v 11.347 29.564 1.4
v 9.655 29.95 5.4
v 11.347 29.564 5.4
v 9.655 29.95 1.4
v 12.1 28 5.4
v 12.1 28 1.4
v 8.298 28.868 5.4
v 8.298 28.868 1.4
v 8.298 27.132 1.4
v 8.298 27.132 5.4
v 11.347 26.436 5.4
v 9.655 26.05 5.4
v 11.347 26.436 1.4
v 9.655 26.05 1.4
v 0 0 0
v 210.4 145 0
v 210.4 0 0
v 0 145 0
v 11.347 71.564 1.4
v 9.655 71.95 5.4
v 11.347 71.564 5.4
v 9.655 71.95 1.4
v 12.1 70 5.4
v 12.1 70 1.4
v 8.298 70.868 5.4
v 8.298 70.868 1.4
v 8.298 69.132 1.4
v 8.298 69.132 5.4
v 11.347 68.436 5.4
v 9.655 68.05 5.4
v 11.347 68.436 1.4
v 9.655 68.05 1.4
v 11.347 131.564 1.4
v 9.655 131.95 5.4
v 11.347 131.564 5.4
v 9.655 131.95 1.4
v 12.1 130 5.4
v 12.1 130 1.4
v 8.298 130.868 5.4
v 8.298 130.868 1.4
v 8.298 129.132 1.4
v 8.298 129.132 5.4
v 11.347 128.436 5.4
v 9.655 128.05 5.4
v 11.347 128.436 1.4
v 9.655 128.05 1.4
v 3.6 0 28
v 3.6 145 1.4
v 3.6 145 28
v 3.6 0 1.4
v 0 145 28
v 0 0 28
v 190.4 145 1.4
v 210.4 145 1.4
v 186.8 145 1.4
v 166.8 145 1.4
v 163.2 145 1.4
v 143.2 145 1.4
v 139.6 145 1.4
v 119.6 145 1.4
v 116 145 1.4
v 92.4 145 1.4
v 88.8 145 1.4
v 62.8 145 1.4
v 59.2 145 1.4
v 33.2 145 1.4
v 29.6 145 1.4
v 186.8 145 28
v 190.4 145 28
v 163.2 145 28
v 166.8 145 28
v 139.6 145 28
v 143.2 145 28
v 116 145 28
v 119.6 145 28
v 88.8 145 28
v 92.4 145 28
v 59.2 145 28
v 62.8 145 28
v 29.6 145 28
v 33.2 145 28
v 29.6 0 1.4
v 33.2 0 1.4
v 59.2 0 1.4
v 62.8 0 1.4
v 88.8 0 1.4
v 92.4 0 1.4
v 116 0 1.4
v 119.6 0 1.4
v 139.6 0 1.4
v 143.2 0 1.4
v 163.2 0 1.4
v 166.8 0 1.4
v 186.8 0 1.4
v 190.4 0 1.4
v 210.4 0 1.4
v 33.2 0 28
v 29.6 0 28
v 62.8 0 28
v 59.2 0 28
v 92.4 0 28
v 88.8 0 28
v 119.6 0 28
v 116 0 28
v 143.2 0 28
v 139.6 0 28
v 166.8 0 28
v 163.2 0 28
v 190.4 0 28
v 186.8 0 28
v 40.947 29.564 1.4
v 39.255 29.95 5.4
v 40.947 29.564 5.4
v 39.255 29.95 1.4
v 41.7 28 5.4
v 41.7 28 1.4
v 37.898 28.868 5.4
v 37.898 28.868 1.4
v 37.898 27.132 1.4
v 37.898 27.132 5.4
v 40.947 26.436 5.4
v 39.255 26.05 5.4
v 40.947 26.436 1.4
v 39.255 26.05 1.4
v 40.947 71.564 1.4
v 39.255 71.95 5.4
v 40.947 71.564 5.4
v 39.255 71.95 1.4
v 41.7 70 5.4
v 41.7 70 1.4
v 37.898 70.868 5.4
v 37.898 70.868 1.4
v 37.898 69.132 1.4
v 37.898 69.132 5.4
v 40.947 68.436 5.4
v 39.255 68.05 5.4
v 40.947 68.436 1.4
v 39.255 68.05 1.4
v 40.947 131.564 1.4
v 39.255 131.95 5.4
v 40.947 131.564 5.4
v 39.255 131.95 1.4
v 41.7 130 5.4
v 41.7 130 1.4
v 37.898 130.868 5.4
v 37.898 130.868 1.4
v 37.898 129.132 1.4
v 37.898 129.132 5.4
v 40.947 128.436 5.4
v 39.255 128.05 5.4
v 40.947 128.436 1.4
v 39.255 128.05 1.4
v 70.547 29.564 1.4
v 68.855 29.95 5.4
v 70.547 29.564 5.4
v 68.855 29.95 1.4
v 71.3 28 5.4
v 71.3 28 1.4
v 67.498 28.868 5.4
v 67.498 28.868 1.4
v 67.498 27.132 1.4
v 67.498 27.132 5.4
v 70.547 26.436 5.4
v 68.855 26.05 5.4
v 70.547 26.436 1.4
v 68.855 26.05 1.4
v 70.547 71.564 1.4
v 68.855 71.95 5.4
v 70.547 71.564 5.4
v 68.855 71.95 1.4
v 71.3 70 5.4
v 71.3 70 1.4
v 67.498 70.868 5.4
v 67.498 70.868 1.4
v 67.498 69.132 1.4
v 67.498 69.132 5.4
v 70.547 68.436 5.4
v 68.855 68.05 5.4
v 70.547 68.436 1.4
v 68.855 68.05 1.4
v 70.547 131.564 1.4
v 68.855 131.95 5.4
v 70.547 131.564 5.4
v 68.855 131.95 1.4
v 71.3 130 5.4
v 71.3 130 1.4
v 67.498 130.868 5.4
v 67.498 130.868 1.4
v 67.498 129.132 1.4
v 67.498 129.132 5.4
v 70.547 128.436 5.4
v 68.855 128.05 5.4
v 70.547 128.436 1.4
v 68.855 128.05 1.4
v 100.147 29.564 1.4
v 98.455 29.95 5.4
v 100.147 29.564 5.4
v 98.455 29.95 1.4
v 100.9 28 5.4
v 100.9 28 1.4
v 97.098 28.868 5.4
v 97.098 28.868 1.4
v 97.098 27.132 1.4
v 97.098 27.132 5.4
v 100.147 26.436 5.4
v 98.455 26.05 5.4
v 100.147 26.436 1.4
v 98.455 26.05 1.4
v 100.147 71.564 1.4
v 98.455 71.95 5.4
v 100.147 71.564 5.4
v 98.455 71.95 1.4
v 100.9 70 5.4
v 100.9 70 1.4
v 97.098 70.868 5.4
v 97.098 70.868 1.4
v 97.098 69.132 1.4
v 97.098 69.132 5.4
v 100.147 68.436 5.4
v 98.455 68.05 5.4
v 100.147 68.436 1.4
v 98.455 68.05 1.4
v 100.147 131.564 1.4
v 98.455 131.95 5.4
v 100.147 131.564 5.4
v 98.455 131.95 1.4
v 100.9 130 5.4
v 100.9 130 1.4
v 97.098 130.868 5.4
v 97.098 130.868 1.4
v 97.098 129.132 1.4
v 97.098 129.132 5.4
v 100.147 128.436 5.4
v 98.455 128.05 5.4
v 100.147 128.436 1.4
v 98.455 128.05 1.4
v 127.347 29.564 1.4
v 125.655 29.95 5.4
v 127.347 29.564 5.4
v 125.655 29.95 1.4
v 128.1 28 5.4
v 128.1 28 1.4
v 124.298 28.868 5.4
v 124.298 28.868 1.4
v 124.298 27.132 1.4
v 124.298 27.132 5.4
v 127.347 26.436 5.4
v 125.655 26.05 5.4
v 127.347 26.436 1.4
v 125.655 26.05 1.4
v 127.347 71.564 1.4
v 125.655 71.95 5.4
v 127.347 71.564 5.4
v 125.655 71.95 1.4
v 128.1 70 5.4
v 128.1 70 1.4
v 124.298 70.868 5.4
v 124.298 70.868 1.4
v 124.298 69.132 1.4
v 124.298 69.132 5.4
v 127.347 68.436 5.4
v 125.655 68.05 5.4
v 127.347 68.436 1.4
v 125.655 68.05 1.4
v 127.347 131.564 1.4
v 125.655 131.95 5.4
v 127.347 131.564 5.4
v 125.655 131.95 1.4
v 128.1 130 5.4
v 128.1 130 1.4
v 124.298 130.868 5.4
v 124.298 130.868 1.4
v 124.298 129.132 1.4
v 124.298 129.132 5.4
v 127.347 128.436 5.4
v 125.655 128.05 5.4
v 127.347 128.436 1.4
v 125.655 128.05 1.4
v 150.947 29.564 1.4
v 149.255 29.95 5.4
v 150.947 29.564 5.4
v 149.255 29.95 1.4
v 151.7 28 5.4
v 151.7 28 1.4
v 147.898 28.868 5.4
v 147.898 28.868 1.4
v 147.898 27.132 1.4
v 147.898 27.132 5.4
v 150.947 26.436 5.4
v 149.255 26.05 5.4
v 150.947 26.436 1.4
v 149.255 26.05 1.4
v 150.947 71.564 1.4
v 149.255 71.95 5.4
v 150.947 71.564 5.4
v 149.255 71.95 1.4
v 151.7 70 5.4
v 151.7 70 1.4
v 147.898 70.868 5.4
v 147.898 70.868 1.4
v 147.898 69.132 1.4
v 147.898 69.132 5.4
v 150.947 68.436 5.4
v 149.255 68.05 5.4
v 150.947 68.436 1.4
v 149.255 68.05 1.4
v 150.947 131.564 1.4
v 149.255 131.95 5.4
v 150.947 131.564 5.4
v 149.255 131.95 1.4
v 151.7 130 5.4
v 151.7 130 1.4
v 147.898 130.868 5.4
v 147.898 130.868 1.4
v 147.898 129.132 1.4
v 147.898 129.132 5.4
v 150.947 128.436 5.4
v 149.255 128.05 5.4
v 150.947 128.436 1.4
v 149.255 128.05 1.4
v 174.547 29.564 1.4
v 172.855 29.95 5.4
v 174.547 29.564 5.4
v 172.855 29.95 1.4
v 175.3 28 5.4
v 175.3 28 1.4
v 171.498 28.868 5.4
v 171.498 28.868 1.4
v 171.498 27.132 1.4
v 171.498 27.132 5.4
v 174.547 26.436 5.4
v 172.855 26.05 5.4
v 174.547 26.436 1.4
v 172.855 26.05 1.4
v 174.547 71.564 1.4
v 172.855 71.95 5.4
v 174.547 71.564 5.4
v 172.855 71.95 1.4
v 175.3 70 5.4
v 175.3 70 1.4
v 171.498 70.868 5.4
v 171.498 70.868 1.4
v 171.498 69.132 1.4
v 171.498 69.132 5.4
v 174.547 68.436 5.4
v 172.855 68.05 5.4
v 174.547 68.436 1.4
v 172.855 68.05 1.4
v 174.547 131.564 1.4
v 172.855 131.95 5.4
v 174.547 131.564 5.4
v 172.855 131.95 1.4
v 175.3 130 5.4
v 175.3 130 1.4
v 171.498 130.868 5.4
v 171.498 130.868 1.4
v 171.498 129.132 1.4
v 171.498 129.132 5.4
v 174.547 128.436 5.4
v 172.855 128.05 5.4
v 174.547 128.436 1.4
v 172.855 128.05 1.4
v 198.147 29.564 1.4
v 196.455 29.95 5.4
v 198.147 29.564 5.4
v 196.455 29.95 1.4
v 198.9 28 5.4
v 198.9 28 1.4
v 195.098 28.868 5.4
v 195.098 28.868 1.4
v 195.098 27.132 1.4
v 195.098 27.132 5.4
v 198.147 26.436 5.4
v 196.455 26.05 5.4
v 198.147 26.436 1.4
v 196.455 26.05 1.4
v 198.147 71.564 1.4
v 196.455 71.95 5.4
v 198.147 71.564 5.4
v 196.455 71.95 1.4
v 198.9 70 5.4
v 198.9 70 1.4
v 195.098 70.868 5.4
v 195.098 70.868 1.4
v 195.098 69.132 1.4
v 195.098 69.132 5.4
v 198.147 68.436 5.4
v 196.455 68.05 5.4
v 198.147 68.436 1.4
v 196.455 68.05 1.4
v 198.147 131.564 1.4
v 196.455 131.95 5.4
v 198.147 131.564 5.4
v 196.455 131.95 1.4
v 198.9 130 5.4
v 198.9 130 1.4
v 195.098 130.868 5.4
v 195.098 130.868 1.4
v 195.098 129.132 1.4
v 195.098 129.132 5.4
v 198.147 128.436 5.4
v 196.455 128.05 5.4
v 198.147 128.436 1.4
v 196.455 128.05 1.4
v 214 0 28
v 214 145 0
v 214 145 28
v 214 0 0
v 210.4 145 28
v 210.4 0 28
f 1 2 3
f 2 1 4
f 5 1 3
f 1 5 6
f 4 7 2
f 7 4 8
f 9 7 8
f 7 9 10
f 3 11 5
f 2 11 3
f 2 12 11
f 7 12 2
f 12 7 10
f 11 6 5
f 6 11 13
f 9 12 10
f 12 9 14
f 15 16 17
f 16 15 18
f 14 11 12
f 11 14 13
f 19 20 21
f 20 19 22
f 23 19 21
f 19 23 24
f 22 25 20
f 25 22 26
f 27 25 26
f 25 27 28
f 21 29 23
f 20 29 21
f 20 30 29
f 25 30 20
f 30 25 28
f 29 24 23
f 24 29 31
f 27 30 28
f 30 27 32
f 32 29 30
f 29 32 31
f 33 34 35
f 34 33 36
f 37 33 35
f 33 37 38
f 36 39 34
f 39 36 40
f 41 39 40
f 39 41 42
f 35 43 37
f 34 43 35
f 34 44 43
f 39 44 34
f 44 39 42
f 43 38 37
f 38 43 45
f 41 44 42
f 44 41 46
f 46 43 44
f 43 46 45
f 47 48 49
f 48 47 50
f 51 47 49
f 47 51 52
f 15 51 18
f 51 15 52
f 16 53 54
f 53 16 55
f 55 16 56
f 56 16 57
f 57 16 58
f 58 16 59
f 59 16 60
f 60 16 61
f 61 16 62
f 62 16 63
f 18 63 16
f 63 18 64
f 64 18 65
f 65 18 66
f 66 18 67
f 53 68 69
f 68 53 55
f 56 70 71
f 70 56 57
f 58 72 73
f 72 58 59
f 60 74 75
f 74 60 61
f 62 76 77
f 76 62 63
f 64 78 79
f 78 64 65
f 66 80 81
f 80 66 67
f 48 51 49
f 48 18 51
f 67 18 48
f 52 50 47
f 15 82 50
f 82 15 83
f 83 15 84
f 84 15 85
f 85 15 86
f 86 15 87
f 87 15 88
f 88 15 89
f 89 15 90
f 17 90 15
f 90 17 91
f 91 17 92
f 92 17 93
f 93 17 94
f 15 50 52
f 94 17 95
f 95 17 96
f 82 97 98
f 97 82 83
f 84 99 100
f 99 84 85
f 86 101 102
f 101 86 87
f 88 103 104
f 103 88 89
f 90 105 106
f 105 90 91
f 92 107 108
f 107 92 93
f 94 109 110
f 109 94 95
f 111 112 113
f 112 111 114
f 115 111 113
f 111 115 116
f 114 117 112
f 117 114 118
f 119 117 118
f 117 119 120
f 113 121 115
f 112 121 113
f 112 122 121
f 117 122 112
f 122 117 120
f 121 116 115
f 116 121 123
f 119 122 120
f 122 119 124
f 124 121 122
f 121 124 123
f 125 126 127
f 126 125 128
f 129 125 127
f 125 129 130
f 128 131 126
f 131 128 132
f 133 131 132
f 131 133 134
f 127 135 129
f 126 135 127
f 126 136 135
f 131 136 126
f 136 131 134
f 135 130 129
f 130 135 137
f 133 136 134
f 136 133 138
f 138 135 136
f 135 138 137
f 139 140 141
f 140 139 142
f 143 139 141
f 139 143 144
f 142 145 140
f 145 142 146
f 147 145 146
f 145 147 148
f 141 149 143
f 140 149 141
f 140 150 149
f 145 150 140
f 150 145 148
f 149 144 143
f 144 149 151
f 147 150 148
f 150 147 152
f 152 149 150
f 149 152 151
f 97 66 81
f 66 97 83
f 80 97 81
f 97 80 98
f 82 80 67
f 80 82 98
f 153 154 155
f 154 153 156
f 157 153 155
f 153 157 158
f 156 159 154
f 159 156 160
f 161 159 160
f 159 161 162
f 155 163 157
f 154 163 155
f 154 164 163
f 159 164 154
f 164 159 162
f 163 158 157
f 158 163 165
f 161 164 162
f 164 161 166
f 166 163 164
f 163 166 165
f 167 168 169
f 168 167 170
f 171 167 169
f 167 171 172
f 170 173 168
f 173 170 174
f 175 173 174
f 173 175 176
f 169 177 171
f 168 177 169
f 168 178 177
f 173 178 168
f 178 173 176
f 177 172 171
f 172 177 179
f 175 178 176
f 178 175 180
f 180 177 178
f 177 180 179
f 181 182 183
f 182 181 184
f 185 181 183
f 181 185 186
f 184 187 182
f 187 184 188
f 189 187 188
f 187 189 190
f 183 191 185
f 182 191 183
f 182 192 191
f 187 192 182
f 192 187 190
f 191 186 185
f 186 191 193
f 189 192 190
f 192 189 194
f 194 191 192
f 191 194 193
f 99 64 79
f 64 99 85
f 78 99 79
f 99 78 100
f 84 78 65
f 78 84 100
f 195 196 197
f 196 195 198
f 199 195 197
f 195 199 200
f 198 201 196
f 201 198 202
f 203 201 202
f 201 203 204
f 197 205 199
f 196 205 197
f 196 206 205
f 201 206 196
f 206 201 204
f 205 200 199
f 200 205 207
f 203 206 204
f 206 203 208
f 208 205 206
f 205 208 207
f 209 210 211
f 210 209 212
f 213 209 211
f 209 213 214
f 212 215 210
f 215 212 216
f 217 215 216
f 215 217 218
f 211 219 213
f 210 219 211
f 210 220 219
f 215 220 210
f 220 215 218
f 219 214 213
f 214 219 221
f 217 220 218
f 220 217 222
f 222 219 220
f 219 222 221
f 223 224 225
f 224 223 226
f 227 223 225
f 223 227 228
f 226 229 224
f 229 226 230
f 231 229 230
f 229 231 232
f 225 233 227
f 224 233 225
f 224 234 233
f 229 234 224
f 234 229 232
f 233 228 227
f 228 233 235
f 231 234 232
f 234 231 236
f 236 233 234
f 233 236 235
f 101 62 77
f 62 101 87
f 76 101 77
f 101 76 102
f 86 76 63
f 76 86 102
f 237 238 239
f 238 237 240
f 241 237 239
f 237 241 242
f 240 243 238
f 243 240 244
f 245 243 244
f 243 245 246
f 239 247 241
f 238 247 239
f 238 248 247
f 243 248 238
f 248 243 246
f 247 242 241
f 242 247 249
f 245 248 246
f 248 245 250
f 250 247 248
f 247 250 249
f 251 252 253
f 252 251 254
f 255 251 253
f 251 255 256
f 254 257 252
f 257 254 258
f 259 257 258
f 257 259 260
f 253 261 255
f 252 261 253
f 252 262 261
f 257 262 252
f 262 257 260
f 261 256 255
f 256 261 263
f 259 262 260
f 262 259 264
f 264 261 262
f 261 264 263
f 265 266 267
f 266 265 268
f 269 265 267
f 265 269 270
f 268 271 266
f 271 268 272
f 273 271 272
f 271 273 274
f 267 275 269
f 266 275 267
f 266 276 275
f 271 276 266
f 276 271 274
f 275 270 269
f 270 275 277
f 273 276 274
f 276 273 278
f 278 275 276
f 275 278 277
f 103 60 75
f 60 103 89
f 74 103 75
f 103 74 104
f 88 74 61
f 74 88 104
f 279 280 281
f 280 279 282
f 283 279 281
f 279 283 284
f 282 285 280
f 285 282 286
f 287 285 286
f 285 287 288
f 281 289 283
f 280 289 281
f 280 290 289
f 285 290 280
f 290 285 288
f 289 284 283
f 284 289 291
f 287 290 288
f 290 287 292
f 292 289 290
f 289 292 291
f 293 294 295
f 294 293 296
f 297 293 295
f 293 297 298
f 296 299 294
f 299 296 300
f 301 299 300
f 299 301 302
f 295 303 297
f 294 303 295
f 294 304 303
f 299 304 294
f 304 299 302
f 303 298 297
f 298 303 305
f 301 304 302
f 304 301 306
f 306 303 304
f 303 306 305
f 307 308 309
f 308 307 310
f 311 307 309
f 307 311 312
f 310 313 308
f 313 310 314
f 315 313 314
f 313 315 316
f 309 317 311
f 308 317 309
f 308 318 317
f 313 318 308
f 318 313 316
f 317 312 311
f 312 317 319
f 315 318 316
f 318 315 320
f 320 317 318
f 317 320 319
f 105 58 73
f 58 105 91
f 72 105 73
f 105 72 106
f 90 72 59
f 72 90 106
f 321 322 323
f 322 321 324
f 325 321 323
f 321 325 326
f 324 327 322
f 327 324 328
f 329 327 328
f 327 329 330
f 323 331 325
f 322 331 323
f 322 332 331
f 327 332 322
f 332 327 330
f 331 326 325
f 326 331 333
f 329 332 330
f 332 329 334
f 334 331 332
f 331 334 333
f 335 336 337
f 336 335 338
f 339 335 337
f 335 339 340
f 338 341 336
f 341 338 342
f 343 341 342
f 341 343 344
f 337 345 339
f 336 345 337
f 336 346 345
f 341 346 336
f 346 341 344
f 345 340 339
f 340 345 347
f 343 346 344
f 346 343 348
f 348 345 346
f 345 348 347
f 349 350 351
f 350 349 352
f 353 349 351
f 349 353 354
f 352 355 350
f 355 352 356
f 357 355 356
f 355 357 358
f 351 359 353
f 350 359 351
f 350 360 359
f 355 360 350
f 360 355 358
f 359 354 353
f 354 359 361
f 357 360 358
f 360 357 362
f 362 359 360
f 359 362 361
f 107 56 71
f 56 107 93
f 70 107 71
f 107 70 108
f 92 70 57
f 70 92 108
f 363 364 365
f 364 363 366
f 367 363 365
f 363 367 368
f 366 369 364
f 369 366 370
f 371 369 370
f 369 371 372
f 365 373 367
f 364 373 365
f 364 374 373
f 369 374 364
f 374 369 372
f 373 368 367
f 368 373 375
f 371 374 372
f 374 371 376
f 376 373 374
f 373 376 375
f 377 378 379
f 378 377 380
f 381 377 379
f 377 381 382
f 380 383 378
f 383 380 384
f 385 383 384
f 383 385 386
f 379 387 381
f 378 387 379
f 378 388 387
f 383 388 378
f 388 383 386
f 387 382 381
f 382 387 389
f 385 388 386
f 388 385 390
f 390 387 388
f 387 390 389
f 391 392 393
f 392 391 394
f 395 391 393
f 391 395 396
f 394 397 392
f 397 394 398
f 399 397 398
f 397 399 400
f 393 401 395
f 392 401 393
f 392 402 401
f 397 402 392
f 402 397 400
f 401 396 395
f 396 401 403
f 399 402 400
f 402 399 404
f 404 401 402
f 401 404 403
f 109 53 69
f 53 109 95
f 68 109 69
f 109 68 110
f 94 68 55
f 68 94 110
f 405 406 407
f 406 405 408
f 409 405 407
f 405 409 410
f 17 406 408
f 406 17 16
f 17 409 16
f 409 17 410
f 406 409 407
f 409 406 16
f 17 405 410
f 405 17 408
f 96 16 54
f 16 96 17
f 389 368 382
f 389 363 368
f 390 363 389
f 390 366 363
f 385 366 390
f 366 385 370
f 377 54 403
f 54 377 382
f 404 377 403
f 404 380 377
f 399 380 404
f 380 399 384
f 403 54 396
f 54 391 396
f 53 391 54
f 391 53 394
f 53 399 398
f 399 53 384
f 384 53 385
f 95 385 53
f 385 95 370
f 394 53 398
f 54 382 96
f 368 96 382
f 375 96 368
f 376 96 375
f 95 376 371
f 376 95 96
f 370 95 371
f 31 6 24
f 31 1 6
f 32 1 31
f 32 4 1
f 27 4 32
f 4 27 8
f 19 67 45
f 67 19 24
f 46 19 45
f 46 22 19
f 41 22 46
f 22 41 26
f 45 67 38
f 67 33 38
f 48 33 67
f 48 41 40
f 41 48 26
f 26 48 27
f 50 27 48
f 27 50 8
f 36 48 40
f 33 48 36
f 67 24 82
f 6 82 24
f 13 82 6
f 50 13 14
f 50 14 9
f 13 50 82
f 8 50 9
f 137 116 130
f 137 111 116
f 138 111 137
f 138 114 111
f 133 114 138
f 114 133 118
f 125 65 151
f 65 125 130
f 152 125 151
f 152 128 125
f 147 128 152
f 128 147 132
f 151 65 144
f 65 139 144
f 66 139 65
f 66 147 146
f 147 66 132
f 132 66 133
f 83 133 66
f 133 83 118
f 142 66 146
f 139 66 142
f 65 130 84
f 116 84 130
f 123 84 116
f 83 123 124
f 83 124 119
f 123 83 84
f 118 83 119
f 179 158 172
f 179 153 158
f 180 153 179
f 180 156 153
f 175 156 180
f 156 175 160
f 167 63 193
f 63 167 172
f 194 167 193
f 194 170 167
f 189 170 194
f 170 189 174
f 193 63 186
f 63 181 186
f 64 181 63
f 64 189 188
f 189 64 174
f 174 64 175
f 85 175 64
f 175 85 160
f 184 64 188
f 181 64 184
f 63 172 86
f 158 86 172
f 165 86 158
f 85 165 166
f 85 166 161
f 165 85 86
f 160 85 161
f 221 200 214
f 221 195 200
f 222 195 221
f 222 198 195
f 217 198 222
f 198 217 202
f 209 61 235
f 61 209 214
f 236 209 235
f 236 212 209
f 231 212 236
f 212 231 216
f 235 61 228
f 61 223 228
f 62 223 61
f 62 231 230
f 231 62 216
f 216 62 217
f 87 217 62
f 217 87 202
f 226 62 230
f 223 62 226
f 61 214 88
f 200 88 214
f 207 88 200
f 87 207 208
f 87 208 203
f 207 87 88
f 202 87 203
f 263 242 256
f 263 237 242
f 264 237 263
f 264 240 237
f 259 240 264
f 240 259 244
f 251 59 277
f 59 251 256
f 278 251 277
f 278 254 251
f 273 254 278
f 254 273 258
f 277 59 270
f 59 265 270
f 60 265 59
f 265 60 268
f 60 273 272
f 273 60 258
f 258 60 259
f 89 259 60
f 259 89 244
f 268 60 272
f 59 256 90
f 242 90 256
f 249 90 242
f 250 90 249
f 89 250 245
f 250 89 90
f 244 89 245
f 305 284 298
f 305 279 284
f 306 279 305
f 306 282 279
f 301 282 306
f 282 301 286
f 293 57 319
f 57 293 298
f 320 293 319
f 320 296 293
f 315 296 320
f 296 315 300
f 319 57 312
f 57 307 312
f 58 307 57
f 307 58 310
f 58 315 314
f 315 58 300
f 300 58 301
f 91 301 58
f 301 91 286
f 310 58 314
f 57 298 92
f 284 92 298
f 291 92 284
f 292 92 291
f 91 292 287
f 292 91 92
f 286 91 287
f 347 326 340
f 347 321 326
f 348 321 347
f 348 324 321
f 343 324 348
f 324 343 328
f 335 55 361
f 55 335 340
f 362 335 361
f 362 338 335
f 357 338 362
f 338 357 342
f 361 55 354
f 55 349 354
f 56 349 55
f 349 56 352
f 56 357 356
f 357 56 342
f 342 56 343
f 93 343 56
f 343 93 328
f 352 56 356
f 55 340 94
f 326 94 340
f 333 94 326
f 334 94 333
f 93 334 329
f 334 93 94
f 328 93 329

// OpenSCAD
total_width = 210.4; //mm
rack_unit_height = 44.45; //mm
shelf_height_units = 3;
shelf_height = shelf_height_units * rack_unit_height; //mm
shelf_thickness = 1.4; //mm
wall_thickness = 3.6; //mm
rack_width = 250; //mm
rack_hole_offset = 7;

// disks
wide_disk_count = 3;
slim_disk_count = 5;
wide_disk_width = 26; //mm
slim_disk_width = 20; //mm
disk_height = 28; //mm
disk_length = 145; //mm

// holes
hole_diameter = 4; //mm
hole_disk_x_offset = 6.5; //mm
hole_disk_y_offset = [28, 70, 130]; //mm
hole_depth = 4; //mm

// modules
module base() {
  cube([total_width, disk_length, shelf_thickness], center = [true, false, false]);
}

module outer_wall() {
  polyhedron([
      [0,0,0], [wall_thickness, 0, 0], [wall_thickness, disk_length, 0], [0, disk_length, 0], // Base (0-3)
      [0, disk_length, disk_height], [wall_thickness, disk_length, disk_height], // Rear (4-5)
      [0, 0, shelf_height], [wall_thickness, 0, shelf_height] //Front (6-7)
    ], [
      [0,1,2,3], // Base
      [3,2,5,4], // Rear
      [0,1,7,6], // Front
      [0,3,4,6], // Left
      [1,2,5,7], // Right
      [6,7,5,4] // Top
    ]);
}

module disk_wall() {
  cube([wall_thickness, disk_length, disk_height]);
}

module disk_pin() {
  cylinder(h = shelf_thickness + hole_depth, r = hole_diameter / 2, center = [true, false, false]);
}

module rack_bracket(side="left"){

}

// disk shelf
base();
// outer_wall();
// translate([total_width, 0, 0]) {
//   outer_wall();
// }

for (i = [0 : wide_disk_count]) {
  translate ([i * (wide_disk_width + wall_thickness), 0, 0]) {
    disk_wall();

    for (j = hole_disk_y_offset) {
      translate([wall_thickness + hole_disk_x_offset, j, 0]) {
        disk_pin();
      }
    }
  }
}
translate([(wide_disk_count * (wide_disk_width + wall_thickness)) + wall_thickness, 0, 0]) {
  for (i = [1 : slim_disk_count]) {
    translate ([i * (slim_disk_width + wall_thickness), 0, 0]) {
      disk_wall();

      if (i < slim_disk_count) {
        for (j = hole_disk_y_offset) {
          translate([wall_thickness + hole_disk_x_offset, j, 0]) {
            disk_pin();
          }
        }
      }
    }
  }
}
